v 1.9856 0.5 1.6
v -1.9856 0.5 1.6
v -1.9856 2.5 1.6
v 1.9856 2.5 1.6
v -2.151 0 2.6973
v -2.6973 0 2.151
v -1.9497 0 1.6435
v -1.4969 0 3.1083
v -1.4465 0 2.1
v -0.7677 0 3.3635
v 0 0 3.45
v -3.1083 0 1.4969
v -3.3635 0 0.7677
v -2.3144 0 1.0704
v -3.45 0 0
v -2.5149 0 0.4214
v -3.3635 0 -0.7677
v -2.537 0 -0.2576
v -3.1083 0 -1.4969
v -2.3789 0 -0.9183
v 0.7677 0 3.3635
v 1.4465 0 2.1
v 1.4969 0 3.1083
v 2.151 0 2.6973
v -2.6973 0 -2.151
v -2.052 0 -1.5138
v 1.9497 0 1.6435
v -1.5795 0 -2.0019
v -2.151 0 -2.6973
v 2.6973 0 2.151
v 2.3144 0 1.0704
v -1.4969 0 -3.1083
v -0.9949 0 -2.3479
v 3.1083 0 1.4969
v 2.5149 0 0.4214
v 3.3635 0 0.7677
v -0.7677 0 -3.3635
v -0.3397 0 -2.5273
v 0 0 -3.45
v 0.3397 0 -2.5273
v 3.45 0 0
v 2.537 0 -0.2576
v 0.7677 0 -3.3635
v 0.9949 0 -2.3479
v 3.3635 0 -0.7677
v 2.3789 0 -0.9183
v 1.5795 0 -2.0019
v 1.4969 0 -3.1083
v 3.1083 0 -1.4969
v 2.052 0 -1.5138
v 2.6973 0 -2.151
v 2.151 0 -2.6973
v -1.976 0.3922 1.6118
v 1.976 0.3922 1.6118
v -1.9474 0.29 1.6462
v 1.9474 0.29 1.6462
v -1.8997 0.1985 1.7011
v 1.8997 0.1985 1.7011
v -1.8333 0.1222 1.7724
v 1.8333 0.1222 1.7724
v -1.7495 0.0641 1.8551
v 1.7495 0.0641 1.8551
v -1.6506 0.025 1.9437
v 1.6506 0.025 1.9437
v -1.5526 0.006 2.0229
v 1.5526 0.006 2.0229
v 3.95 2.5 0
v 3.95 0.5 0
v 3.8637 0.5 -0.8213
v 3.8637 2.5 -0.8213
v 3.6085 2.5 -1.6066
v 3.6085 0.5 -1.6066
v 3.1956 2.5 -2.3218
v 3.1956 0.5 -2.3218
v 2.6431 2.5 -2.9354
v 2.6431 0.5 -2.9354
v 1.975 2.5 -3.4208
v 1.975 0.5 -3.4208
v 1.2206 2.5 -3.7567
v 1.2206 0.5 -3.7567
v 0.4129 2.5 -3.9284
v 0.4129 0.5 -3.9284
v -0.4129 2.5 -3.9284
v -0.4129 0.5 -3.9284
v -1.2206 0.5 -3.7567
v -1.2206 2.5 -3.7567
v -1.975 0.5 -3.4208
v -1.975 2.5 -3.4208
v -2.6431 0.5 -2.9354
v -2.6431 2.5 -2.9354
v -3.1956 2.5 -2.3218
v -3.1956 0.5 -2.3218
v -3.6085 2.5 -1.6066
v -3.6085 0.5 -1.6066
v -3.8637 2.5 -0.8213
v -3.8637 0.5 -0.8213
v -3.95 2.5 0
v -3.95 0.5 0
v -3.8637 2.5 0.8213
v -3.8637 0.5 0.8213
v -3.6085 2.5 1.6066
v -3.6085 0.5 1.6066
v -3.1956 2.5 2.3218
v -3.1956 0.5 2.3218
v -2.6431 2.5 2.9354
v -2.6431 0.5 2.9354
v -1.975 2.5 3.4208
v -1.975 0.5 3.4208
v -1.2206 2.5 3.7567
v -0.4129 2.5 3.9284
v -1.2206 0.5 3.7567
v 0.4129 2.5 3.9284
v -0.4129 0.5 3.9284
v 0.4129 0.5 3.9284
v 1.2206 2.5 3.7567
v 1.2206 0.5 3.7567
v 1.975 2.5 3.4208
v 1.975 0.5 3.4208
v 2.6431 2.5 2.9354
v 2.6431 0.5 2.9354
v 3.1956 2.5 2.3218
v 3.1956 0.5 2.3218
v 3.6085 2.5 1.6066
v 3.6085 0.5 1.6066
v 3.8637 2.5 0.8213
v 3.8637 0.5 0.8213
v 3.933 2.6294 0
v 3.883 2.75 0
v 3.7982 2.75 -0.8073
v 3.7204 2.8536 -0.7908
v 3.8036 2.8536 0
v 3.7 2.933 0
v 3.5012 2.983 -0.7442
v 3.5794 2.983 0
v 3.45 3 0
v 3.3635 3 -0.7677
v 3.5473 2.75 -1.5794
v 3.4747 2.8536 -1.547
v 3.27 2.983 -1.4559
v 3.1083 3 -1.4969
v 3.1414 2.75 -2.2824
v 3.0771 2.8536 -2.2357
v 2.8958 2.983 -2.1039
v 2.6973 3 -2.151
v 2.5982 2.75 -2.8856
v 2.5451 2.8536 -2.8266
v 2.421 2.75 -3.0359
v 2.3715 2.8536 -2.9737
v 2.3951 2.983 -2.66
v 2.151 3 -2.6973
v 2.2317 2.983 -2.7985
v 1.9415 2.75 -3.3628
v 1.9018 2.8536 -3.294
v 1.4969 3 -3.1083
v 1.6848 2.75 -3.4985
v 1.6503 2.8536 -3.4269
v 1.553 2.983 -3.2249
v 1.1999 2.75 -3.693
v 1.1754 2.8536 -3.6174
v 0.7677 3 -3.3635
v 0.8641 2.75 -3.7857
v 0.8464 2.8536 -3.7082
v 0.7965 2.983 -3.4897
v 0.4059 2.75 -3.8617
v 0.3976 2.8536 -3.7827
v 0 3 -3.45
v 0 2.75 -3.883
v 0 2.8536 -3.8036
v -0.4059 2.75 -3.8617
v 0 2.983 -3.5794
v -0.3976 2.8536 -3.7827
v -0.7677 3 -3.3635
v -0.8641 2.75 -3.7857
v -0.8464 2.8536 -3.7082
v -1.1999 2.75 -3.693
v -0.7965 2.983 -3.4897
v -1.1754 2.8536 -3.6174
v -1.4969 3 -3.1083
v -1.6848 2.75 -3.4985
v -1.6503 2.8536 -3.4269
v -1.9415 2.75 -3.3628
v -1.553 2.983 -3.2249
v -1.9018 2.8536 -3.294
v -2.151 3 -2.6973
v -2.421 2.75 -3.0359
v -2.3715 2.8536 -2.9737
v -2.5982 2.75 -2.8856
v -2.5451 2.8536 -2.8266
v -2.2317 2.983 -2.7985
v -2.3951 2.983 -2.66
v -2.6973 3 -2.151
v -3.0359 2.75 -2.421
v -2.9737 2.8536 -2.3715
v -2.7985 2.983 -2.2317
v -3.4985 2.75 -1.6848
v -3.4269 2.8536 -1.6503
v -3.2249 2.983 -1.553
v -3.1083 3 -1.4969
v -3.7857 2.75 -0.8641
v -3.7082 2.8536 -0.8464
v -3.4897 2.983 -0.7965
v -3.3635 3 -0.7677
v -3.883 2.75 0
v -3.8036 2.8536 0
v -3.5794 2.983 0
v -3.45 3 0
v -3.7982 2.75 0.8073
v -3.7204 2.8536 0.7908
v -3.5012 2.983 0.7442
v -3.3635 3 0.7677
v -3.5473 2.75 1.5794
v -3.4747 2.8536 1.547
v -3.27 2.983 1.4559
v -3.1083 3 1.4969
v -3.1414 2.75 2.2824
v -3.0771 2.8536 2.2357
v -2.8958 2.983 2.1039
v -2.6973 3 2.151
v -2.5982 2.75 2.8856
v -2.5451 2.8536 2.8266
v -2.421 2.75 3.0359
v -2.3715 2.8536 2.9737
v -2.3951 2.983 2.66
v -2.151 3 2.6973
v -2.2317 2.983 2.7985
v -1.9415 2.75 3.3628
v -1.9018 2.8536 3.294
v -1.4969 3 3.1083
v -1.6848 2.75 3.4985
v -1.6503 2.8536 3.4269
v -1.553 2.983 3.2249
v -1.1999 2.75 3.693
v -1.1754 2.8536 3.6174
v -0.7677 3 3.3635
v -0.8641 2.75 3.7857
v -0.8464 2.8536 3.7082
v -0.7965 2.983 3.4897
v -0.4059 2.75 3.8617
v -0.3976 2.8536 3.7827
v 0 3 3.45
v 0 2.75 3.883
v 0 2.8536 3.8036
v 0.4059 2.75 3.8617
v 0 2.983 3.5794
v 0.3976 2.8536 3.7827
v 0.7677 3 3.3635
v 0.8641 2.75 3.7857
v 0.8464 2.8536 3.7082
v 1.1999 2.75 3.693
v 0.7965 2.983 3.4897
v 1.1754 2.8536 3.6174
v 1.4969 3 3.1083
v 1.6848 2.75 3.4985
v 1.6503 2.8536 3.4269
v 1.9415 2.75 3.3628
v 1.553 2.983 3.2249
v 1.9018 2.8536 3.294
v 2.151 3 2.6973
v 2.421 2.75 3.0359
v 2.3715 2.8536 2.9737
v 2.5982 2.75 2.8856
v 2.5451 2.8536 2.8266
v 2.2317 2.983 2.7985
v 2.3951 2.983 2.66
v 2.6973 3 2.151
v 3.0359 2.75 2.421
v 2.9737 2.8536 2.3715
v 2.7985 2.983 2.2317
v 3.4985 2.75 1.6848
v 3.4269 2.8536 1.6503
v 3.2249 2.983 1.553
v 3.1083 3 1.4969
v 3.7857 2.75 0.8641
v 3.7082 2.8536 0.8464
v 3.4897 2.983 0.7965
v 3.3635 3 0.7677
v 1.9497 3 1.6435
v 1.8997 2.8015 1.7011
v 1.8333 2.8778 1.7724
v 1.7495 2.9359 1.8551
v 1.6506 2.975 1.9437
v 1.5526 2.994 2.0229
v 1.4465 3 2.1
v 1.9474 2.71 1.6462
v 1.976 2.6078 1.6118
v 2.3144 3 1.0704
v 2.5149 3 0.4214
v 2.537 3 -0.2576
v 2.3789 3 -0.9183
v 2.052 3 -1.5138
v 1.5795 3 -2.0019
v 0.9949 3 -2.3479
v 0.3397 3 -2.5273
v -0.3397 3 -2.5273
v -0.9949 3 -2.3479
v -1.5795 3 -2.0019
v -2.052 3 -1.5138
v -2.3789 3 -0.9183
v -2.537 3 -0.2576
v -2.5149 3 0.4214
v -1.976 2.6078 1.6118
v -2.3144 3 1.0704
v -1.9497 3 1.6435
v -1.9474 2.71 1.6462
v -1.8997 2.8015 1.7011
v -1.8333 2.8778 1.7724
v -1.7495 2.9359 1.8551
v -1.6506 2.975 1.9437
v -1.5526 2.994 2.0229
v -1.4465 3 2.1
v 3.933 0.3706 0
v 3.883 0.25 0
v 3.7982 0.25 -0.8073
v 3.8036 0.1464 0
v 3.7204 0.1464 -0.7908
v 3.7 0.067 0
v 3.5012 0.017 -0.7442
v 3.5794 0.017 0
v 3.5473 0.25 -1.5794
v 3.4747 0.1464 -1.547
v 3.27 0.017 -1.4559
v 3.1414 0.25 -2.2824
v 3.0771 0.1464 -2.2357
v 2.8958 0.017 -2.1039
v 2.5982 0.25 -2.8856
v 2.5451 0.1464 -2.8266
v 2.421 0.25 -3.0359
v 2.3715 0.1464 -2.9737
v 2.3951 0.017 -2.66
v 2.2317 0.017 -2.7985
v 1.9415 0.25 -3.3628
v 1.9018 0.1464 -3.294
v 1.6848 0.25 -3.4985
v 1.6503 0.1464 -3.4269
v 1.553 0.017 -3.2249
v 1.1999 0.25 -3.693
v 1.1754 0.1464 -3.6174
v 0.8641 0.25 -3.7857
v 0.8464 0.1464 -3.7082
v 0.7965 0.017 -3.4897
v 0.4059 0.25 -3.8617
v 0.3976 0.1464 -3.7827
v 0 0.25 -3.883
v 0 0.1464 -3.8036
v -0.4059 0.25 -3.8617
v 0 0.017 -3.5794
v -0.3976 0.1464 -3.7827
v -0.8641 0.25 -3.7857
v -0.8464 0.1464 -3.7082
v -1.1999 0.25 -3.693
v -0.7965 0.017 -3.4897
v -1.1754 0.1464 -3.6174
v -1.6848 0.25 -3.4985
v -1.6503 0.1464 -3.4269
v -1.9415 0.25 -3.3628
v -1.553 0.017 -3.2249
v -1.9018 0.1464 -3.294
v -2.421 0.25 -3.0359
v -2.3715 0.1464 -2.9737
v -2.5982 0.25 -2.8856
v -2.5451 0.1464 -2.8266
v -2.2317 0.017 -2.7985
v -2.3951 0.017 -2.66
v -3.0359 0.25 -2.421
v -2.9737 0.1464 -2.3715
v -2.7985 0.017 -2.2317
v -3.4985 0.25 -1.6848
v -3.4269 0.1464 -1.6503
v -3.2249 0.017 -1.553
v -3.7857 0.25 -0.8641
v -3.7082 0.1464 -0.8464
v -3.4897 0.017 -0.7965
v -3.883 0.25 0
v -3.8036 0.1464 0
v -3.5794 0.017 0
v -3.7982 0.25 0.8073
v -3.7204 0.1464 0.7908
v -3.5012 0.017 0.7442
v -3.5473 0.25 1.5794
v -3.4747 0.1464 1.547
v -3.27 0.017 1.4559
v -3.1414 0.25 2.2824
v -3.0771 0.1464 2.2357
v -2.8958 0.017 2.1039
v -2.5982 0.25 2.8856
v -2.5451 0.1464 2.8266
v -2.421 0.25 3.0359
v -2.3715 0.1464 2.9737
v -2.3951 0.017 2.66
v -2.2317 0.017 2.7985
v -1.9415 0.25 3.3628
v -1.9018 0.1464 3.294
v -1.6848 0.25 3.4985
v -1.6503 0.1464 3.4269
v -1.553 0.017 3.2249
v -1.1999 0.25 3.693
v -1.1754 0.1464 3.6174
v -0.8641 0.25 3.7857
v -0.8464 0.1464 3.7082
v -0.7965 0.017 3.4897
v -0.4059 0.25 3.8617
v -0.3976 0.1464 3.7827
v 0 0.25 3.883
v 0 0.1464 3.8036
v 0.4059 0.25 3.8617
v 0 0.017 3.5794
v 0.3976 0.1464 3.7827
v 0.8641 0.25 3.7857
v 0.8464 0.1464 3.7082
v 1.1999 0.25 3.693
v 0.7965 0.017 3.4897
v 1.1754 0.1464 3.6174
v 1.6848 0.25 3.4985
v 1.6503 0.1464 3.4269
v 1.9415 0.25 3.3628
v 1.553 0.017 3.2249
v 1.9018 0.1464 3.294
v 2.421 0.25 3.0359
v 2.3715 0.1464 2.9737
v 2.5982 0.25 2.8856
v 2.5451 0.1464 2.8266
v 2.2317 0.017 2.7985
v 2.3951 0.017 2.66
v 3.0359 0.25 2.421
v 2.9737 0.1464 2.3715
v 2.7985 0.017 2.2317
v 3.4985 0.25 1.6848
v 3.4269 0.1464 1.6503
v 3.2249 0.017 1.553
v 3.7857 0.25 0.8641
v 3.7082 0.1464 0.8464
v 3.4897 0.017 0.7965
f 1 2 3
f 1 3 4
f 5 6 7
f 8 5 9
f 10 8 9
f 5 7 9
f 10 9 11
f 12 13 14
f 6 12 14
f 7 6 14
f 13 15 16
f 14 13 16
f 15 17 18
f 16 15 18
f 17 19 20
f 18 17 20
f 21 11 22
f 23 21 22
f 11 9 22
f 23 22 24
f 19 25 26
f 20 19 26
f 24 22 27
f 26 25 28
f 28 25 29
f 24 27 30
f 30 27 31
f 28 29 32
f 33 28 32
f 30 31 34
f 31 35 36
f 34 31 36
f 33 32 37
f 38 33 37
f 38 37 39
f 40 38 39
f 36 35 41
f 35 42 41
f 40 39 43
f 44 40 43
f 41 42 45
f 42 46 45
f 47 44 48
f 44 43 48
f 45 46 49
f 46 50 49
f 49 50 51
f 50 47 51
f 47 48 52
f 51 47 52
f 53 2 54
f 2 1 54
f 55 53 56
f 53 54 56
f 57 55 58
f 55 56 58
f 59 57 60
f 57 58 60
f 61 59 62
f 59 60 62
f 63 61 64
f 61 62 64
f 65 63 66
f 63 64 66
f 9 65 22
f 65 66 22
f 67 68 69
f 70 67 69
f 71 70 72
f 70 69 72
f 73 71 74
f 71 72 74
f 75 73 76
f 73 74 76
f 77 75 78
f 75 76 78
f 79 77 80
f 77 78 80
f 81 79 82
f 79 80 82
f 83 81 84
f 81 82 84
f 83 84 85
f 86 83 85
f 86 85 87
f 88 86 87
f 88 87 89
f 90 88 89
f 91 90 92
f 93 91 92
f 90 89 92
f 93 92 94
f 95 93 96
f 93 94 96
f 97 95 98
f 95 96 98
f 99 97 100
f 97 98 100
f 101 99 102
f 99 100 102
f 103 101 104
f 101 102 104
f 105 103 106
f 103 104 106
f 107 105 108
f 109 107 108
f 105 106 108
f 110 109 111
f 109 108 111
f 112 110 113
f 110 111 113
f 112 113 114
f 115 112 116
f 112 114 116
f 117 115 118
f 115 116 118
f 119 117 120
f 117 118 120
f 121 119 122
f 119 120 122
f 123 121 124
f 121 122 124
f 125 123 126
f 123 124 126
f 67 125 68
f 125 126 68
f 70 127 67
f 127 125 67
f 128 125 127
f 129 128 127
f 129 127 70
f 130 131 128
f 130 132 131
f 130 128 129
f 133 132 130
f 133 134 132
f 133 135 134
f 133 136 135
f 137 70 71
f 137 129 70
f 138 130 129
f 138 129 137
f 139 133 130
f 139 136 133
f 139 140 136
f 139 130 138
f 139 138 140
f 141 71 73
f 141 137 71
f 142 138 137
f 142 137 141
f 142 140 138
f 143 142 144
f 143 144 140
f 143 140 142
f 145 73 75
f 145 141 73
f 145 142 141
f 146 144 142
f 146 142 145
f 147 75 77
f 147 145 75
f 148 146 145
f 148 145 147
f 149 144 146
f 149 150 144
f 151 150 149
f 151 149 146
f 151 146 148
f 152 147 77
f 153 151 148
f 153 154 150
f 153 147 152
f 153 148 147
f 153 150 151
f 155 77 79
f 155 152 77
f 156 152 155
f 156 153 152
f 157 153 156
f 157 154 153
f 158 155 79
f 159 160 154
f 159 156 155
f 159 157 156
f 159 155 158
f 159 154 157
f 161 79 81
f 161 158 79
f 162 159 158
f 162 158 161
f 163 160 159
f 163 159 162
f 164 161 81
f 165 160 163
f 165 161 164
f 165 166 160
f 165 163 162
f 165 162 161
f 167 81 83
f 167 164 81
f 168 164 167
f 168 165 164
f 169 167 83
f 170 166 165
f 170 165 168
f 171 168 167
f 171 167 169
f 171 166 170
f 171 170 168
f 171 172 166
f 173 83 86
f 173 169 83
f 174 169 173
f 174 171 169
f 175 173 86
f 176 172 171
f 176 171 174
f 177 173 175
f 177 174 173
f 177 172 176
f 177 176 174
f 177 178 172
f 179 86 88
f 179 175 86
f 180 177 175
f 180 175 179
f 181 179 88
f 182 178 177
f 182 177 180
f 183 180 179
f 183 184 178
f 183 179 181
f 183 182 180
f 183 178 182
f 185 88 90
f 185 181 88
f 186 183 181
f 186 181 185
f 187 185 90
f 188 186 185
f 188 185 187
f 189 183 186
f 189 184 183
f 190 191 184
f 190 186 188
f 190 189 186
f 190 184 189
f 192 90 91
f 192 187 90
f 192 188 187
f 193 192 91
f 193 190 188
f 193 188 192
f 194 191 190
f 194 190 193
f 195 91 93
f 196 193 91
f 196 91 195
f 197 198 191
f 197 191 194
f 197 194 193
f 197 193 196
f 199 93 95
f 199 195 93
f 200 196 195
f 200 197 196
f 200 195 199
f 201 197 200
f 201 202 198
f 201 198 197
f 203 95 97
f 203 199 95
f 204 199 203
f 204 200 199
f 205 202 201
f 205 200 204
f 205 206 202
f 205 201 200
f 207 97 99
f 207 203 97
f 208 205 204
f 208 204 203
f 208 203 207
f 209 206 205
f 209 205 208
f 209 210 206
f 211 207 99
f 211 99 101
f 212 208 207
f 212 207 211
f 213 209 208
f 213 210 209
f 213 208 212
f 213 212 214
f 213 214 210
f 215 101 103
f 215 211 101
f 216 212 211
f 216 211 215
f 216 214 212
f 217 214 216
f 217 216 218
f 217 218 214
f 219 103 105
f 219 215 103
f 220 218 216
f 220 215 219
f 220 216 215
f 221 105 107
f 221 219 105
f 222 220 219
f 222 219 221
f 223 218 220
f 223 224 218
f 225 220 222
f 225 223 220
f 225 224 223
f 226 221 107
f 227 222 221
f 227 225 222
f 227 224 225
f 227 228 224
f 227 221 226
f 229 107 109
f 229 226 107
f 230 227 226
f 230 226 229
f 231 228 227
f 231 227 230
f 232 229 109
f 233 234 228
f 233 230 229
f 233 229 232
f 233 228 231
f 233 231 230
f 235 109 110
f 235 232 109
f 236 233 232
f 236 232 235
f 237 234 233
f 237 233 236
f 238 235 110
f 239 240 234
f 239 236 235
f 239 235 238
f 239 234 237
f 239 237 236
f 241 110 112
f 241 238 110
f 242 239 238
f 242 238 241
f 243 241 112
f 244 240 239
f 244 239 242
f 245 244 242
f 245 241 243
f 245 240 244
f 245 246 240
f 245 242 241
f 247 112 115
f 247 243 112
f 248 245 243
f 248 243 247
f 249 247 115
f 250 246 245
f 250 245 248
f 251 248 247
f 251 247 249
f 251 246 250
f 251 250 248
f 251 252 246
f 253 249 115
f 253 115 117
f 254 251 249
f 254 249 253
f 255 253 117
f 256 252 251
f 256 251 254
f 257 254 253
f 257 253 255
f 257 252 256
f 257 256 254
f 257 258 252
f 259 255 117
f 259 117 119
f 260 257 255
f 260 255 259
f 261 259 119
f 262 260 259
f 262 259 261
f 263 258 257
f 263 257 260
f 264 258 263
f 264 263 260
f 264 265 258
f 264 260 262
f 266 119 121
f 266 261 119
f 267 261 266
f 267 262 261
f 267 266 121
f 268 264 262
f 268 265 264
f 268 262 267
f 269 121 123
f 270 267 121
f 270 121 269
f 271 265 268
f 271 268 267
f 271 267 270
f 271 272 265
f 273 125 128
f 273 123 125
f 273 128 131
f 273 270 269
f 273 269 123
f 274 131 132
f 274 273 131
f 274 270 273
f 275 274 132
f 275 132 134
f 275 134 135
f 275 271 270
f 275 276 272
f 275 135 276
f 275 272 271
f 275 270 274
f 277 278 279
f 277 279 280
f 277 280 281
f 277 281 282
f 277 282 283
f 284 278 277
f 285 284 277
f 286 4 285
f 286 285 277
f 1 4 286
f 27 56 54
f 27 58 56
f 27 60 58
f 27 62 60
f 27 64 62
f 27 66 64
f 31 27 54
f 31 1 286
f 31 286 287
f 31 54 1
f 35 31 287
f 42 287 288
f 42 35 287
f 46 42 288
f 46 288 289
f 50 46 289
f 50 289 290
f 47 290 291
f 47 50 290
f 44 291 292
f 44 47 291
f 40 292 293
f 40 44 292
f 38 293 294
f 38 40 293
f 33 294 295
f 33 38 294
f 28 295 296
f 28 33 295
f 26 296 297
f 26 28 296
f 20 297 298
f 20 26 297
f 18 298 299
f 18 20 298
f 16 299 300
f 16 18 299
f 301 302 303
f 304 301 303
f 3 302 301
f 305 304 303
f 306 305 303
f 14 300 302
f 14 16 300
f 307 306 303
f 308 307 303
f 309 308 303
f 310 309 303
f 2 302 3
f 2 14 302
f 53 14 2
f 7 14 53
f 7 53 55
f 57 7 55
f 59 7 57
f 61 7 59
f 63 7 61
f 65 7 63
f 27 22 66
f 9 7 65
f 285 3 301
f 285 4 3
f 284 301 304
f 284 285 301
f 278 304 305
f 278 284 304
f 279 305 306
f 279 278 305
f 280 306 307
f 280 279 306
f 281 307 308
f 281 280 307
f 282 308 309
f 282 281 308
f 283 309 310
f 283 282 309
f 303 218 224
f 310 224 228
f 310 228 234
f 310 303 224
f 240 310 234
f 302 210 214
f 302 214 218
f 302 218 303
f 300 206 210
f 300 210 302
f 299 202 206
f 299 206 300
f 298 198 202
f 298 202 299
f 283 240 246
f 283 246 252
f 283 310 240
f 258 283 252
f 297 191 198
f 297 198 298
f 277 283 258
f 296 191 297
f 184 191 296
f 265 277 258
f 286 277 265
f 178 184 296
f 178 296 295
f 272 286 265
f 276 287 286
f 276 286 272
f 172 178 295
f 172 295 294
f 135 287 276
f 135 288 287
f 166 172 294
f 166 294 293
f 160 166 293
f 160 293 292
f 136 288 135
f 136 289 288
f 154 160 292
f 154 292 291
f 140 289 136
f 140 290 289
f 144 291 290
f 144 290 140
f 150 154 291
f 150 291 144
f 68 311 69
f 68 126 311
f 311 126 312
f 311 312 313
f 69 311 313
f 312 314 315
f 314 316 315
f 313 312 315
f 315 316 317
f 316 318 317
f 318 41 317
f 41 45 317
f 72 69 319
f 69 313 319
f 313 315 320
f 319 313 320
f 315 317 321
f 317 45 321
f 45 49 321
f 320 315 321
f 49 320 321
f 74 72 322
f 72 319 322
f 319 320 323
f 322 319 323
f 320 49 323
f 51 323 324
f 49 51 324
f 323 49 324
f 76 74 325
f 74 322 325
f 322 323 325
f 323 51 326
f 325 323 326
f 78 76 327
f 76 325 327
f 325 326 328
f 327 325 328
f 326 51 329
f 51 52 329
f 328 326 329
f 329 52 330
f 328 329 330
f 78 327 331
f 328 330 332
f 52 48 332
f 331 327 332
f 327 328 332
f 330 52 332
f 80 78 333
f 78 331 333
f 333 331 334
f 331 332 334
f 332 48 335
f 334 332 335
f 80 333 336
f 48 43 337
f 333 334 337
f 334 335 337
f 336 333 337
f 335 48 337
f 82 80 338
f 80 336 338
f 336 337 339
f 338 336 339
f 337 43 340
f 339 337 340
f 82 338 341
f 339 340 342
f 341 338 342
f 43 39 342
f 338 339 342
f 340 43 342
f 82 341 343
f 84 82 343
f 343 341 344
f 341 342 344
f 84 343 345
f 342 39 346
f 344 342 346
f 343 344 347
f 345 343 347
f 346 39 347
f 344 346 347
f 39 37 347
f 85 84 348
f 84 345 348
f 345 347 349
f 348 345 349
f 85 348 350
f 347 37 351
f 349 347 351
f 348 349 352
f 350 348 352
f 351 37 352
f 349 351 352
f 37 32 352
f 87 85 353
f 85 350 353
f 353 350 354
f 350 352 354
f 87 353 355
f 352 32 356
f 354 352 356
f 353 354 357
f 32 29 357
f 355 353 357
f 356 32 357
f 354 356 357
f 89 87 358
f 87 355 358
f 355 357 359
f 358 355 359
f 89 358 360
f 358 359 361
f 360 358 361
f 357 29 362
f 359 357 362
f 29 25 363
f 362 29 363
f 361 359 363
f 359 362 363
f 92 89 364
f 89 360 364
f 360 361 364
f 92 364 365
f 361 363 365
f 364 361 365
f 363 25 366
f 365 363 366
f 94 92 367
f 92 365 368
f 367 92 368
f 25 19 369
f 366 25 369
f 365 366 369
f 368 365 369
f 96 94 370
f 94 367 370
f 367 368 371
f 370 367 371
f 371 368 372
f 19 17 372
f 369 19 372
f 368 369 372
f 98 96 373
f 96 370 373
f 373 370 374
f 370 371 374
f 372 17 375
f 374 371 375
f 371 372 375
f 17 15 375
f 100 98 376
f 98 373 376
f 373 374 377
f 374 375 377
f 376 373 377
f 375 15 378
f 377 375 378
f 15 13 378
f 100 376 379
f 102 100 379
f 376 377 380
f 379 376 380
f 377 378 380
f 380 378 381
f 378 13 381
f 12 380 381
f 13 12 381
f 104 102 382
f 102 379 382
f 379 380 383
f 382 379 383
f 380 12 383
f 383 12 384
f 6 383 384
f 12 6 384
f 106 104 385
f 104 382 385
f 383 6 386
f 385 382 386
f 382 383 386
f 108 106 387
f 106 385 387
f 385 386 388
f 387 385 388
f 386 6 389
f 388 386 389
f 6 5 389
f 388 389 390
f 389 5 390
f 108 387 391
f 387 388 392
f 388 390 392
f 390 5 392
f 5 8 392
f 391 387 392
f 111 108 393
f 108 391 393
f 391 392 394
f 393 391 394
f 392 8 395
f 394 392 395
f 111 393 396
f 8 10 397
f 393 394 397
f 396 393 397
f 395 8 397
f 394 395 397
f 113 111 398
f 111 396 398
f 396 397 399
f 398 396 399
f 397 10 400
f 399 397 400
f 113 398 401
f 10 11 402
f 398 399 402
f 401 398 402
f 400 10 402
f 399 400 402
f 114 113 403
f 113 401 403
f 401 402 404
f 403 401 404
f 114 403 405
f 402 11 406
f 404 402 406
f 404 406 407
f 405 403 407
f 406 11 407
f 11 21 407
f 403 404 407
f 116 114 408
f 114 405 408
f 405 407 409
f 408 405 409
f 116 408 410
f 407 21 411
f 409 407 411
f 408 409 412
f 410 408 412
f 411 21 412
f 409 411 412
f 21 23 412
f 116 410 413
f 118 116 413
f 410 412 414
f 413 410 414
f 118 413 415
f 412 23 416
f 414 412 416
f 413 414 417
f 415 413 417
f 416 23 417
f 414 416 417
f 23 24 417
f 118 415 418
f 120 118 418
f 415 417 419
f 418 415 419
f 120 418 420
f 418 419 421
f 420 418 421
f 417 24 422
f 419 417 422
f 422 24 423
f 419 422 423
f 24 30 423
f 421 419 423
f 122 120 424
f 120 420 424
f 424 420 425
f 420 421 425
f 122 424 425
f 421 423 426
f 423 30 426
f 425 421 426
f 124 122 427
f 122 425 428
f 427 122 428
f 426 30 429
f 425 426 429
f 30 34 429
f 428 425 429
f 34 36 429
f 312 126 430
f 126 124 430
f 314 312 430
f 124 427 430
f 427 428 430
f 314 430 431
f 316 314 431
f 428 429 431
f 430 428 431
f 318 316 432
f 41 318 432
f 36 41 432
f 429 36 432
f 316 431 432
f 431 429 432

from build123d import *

# Parameters (mm, degrees)
SKETCH1_R           = 3.95
BOSS_EXTRUDE1_DEPTH = 3
FILLET1_R           = 0.5


with BuildPart() as part:
    # Sketch1 → Boss-Extrude1 (new body)
    with BuildSketch(Plane(origin=(0, 0, 0), x_dir=(1, 0, 0), z_dir=(0, 1, 0))):
        Circle(SKETCH1_R)
        with BuildLine():
            Line((-1.985572965, -1.6), (1.985572965, -1.6))
            ThreePointArc((1.985572965, -1.6), (0, 2.55), (-1.985572965, -1.6))
        make_face(mode=Mode.SUBTRACT)
    extrude(amount=BOSS_EXTRUDE1_DEPTH)

    # Fillet1
    fillet1_edges = [part.edges().sort_by_distance(p)[0] for p in [
        (-3.95, 0, 0),
        (-3.95, 3, 0),
        (0, 0, 1.6),
        (0, 3, 1.6),
    ]]
    fillet(fillet1_edges, radius=FILLET1_R)


solid = part.part
